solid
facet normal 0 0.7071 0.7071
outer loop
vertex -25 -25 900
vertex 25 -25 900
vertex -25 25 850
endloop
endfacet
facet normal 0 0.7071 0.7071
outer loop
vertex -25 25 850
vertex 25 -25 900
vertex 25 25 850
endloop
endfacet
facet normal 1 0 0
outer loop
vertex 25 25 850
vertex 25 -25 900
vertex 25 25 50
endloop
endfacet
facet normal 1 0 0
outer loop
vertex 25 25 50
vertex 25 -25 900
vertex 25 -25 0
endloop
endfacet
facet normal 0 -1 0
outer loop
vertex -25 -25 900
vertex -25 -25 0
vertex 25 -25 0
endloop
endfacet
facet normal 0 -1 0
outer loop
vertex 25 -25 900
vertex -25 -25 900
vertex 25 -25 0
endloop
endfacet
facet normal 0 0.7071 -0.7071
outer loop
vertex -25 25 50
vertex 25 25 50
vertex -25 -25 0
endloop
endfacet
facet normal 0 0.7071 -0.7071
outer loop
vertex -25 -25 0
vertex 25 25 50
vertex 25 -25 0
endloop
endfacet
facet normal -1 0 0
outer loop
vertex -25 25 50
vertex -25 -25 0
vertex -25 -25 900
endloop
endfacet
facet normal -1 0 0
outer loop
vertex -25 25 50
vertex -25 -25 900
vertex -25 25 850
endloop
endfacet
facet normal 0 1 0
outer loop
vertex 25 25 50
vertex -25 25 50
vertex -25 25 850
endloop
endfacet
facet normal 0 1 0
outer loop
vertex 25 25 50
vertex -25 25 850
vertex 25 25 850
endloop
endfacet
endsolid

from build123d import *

# Parameters (mm, degrees)
F0_W          = 50
F0_H          = 50
F1_DEPTH      = 900
F3_DEPTH      = 25.001
F3_DEPTH_BACK = 25.001
F5_DEPTH      = 25.001
F5_DEPTH_BACK = 25.001


with BuildPart() as f1:
    # F0 (on Top) → F1 (new body)
    with BuildSketch(Plane.XY):
        Rectangle(F0_W, F0_H)
    extrude(amount=F1_DEPTH)

    # F2 (on Right) → F3 (cut, two sides)
    with BuildSketch(Plane.YZ) as f3_sk:
        Polygon((135.3058686236, 900), (-25, 900), (135.3058686236, 739.6941313764), align=None)
    extrude(amount=-F3_DEPTH, mode=Mode.SUBTRACT)
    extrude(f3_sk.sketch, amount=F3_DEPTH_BACK, mode=Mode.SUBTRACT)

    # F4 (on Right) → F5 (cut, two sides)
    with BuildSketch(Plane.YZ) as f5_sk:
        Polygon((25, 50), (-25, 0), (25, 0), align=None)
    extrude(amount=-F5_DEPTH, mode=Mode.SUBTRACT)
    extrude(f5_sk.sketch, amount=F5_DEPTH_BACK, mode=Mode.SUBTRACT)


solid = f1.part
